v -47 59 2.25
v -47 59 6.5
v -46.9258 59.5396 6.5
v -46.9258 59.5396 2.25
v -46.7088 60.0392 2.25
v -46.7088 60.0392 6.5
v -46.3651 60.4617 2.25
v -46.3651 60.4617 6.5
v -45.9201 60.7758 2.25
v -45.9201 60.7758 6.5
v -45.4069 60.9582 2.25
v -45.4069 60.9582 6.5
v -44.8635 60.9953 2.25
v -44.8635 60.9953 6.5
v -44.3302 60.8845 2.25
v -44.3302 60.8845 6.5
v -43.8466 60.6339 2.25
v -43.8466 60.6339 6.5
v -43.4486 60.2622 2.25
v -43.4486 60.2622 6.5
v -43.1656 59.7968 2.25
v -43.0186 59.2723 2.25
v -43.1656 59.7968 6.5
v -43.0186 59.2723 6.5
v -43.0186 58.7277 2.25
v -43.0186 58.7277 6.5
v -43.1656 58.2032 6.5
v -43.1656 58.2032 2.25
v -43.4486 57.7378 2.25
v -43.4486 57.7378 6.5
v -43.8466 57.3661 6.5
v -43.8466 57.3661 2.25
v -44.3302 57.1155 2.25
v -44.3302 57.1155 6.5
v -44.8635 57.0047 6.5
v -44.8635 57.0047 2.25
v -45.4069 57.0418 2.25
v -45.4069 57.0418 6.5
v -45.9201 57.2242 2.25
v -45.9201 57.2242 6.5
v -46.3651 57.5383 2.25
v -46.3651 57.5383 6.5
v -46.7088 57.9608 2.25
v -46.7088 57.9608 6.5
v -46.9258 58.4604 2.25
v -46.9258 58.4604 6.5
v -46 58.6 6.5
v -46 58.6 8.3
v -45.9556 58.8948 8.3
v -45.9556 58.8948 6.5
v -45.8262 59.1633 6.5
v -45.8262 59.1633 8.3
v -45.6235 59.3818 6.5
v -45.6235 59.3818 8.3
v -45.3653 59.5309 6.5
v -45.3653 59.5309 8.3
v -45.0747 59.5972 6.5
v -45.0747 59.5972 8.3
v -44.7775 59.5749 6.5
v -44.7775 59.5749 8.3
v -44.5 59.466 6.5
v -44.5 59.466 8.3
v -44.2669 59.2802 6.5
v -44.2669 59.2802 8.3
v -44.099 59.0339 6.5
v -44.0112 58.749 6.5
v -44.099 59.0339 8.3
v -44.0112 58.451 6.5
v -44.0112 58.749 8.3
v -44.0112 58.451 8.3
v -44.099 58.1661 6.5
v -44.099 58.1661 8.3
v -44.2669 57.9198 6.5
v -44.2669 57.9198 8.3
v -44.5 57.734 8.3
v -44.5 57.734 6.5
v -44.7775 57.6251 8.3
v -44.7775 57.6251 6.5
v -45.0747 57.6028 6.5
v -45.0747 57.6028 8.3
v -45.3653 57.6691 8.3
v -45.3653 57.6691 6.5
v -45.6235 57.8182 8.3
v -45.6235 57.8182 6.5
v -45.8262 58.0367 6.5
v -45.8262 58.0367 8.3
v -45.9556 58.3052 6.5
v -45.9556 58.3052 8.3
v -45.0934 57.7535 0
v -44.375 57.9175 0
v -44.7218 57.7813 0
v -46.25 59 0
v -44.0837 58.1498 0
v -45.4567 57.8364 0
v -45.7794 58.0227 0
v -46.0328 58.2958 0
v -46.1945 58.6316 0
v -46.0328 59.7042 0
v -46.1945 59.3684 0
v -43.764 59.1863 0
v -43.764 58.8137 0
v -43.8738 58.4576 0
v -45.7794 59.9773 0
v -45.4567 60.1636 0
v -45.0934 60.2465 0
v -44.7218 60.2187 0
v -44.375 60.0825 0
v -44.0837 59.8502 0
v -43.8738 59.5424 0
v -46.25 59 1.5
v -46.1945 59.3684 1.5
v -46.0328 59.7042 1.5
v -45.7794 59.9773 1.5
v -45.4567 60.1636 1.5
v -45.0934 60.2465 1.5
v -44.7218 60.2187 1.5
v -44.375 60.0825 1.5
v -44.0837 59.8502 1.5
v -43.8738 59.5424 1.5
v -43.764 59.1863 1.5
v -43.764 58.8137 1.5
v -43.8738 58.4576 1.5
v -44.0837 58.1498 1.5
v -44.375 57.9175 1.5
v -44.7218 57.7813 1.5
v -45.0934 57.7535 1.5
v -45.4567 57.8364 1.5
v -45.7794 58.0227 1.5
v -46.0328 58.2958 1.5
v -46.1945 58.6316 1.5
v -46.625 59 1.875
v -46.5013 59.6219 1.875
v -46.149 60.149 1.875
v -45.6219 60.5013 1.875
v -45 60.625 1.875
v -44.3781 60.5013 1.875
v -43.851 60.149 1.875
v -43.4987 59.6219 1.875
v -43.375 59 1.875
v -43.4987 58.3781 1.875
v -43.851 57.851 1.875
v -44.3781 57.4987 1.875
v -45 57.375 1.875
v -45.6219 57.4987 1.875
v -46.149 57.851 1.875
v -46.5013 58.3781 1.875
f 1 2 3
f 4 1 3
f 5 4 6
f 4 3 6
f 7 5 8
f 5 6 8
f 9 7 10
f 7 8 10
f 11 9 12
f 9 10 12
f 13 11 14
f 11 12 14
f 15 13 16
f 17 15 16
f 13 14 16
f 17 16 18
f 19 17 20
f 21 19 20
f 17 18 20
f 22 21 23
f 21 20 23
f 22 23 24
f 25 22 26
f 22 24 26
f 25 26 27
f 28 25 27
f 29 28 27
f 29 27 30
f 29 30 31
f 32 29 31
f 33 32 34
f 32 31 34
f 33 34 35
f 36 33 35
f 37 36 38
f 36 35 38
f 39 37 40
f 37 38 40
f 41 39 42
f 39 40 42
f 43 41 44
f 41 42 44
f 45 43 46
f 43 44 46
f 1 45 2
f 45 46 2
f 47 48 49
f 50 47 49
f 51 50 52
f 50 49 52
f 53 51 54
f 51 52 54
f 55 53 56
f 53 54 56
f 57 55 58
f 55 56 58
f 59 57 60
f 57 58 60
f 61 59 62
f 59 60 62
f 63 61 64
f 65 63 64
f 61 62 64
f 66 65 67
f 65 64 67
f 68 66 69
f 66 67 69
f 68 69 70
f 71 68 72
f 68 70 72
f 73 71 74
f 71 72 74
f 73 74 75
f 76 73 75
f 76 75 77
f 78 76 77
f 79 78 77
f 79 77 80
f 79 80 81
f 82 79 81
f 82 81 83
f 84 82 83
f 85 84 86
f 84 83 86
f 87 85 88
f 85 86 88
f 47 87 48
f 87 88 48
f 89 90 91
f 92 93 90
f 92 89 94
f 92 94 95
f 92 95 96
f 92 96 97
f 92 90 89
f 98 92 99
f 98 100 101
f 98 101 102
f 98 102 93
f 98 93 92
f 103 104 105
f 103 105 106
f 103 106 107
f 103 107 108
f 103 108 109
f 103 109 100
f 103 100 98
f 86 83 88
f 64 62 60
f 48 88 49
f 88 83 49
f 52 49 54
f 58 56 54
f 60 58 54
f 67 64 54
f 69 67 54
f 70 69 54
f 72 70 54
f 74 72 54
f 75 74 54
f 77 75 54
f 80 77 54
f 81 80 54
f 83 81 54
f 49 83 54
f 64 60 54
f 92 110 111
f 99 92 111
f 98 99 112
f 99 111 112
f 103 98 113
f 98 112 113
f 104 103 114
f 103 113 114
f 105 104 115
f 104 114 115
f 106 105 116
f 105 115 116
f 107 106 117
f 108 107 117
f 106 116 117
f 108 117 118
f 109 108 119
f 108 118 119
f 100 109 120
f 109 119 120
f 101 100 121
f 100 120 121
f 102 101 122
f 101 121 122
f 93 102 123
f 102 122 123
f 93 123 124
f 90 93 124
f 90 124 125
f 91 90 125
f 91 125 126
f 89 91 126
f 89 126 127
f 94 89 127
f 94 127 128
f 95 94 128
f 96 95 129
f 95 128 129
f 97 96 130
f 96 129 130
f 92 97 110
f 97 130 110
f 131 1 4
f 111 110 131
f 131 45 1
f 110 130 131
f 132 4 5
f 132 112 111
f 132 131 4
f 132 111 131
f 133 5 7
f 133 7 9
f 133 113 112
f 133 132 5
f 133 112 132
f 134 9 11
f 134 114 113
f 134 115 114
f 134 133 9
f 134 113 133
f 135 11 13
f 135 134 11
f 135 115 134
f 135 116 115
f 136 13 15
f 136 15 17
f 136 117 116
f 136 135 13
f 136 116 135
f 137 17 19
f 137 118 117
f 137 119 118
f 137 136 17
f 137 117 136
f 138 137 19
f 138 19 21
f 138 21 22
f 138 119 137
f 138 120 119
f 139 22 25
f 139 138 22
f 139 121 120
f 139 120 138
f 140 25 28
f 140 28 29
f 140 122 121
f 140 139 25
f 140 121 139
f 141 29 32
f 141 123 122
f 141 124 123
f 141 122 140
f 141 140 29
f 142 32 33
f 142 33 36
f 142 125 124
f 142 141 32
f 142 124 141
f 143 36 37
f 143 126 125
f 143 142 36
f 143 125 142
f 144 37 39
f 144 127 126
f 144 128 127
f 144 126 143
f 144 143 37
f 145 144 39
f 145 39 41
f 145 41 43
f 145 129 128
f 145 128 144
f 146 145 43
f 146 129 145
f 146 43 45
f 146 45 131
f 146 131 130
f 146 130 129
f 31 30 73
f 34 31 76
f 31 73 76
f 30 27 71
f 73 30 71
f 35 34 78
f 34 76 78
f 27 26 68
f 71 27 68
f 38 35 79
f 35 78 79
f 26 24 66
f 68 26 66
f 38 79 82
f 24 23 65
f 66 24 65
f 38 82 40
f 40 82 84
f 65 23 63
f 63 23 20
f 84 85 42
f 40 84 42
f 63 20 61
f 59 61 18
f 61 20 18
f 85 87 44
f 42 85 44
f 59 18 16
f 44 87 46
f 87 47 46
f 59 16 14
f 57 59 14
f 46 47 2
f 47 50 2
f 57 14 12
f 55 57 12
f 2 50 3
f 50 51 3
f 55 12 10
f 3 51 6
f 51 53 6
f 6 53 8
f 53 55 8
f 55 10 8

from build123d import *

# Parameters (mm, degrees)
CYLINDER_R             = 2
CYLINDER_DEPTH         = 5
CHAMFER_SIZE           = 0.75
CYLINDER002_R          = 1
CYLINDER002_DEPTH      = 1.8
CYLINDER001_R          = 1.25
CYLINDER001_DEPTH      = 1.5
FUSION_PLACEMENT_ANGLE = 180


with BuildPart() as chamfer001:
    # Cylinder → Cylinder (new body)
    with BuildSketch(Plane.XY):
        Circle(CYLINDER_R)
    extrude(amount=CYLINDER_DEPTH)

    # Chamfer
    chamfer_edges = [chamfer001.edges().sort_by_distance(p)[0] for p in [
        (-2, 0, 5),
    ]]
    chamfer(chamfer_edges, length=CHAMFER_SIZE)


with BuildPart() as chamfer001_1:
    # Clone002 placement: moved
    add(chamfer001.part.moved(Location((0, -6, 0))))


with BuildPart() as cylinder004:
    # Cylinder002 → Cylinder002 (new body)
    with BuildSketch(Plane.XY.offset(-1.8)):
        Circle(CYLINDER002_R)
    extrude(amount=CYLINDER002_DEPTH)


with BuildPart() as cylinder004_1:
    # Clone001 placement: moved
    add(cylinder004.part.moved(Location((0, -6.4, 0))))


with BuildPart() as spacer_desviado:
    # Cylinder001 → Cylinder001 (new body)
    with BuildSketch(Plane.XY.offset(5)):
        Circle(CYLINDER001_R)
    extrude(amount=CYLINDER001_DEPTH)


with BuildPart() as spacer_desviado_1:
    # Clone placement: moved
    add(spacer_desviado.part.moved(Location((0, -6, 0))))

    # Fusion: union Chamfer001, Cylinder004
    add(chamfer001_1.part)
    add(cylinder004_1.part)


with BuildPart() as spacer_desviado_2:
    # Fusion placement: moved
    add(spacer_desviado_1.part.moved(Location((-45, 65, 6.5))).rotate(Axis((-45, 65, 6.5), (0, 1, 0)), FUSION_PLACEMENT_ANGLE))


solid = spacer_desviado_2.part
